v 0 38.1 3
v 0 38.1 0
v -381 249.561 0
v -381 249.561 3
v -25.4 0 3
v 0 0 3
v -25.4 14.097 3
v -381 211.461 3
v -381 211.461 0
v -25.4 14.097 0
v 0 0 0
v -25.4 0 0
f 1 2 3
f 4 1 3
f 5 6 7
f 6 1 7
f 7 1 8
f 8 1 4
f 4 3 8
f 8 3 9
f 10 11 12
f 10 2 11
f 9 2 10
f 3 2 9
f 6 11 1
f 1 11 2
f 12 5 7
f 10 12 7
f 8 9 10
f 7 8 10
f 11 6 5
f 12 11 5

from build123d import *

# Parameters (mm, degrees)
BOSS_EXTRUDE1_DEPTH = 3
BOSS_EXTRUDE2_DEPTH = 3


with BuildPart() as part:
    # Sketch1 → Boss-Extrude1 (new body)
    with BuildSketch(Plane.XY):
        Polygon((-381, 211.461110197), (0, 0), (0, 38.1), (-381, 249.561110197), align=None)
    extrude(amount=BOSS_EXTRUDE1_DEPTH)

    # Sketch3 → Boss-Extrude2 (add)
    with BuildSketch(Plane.XY.offset(3)):
        Polygon((0, 0), (-25.4, 0), (-25.4, 14.097407346), align=None)
    extrude(amount=-BOSS_EXTRUDE2_DEPTH)


solid = part.part
